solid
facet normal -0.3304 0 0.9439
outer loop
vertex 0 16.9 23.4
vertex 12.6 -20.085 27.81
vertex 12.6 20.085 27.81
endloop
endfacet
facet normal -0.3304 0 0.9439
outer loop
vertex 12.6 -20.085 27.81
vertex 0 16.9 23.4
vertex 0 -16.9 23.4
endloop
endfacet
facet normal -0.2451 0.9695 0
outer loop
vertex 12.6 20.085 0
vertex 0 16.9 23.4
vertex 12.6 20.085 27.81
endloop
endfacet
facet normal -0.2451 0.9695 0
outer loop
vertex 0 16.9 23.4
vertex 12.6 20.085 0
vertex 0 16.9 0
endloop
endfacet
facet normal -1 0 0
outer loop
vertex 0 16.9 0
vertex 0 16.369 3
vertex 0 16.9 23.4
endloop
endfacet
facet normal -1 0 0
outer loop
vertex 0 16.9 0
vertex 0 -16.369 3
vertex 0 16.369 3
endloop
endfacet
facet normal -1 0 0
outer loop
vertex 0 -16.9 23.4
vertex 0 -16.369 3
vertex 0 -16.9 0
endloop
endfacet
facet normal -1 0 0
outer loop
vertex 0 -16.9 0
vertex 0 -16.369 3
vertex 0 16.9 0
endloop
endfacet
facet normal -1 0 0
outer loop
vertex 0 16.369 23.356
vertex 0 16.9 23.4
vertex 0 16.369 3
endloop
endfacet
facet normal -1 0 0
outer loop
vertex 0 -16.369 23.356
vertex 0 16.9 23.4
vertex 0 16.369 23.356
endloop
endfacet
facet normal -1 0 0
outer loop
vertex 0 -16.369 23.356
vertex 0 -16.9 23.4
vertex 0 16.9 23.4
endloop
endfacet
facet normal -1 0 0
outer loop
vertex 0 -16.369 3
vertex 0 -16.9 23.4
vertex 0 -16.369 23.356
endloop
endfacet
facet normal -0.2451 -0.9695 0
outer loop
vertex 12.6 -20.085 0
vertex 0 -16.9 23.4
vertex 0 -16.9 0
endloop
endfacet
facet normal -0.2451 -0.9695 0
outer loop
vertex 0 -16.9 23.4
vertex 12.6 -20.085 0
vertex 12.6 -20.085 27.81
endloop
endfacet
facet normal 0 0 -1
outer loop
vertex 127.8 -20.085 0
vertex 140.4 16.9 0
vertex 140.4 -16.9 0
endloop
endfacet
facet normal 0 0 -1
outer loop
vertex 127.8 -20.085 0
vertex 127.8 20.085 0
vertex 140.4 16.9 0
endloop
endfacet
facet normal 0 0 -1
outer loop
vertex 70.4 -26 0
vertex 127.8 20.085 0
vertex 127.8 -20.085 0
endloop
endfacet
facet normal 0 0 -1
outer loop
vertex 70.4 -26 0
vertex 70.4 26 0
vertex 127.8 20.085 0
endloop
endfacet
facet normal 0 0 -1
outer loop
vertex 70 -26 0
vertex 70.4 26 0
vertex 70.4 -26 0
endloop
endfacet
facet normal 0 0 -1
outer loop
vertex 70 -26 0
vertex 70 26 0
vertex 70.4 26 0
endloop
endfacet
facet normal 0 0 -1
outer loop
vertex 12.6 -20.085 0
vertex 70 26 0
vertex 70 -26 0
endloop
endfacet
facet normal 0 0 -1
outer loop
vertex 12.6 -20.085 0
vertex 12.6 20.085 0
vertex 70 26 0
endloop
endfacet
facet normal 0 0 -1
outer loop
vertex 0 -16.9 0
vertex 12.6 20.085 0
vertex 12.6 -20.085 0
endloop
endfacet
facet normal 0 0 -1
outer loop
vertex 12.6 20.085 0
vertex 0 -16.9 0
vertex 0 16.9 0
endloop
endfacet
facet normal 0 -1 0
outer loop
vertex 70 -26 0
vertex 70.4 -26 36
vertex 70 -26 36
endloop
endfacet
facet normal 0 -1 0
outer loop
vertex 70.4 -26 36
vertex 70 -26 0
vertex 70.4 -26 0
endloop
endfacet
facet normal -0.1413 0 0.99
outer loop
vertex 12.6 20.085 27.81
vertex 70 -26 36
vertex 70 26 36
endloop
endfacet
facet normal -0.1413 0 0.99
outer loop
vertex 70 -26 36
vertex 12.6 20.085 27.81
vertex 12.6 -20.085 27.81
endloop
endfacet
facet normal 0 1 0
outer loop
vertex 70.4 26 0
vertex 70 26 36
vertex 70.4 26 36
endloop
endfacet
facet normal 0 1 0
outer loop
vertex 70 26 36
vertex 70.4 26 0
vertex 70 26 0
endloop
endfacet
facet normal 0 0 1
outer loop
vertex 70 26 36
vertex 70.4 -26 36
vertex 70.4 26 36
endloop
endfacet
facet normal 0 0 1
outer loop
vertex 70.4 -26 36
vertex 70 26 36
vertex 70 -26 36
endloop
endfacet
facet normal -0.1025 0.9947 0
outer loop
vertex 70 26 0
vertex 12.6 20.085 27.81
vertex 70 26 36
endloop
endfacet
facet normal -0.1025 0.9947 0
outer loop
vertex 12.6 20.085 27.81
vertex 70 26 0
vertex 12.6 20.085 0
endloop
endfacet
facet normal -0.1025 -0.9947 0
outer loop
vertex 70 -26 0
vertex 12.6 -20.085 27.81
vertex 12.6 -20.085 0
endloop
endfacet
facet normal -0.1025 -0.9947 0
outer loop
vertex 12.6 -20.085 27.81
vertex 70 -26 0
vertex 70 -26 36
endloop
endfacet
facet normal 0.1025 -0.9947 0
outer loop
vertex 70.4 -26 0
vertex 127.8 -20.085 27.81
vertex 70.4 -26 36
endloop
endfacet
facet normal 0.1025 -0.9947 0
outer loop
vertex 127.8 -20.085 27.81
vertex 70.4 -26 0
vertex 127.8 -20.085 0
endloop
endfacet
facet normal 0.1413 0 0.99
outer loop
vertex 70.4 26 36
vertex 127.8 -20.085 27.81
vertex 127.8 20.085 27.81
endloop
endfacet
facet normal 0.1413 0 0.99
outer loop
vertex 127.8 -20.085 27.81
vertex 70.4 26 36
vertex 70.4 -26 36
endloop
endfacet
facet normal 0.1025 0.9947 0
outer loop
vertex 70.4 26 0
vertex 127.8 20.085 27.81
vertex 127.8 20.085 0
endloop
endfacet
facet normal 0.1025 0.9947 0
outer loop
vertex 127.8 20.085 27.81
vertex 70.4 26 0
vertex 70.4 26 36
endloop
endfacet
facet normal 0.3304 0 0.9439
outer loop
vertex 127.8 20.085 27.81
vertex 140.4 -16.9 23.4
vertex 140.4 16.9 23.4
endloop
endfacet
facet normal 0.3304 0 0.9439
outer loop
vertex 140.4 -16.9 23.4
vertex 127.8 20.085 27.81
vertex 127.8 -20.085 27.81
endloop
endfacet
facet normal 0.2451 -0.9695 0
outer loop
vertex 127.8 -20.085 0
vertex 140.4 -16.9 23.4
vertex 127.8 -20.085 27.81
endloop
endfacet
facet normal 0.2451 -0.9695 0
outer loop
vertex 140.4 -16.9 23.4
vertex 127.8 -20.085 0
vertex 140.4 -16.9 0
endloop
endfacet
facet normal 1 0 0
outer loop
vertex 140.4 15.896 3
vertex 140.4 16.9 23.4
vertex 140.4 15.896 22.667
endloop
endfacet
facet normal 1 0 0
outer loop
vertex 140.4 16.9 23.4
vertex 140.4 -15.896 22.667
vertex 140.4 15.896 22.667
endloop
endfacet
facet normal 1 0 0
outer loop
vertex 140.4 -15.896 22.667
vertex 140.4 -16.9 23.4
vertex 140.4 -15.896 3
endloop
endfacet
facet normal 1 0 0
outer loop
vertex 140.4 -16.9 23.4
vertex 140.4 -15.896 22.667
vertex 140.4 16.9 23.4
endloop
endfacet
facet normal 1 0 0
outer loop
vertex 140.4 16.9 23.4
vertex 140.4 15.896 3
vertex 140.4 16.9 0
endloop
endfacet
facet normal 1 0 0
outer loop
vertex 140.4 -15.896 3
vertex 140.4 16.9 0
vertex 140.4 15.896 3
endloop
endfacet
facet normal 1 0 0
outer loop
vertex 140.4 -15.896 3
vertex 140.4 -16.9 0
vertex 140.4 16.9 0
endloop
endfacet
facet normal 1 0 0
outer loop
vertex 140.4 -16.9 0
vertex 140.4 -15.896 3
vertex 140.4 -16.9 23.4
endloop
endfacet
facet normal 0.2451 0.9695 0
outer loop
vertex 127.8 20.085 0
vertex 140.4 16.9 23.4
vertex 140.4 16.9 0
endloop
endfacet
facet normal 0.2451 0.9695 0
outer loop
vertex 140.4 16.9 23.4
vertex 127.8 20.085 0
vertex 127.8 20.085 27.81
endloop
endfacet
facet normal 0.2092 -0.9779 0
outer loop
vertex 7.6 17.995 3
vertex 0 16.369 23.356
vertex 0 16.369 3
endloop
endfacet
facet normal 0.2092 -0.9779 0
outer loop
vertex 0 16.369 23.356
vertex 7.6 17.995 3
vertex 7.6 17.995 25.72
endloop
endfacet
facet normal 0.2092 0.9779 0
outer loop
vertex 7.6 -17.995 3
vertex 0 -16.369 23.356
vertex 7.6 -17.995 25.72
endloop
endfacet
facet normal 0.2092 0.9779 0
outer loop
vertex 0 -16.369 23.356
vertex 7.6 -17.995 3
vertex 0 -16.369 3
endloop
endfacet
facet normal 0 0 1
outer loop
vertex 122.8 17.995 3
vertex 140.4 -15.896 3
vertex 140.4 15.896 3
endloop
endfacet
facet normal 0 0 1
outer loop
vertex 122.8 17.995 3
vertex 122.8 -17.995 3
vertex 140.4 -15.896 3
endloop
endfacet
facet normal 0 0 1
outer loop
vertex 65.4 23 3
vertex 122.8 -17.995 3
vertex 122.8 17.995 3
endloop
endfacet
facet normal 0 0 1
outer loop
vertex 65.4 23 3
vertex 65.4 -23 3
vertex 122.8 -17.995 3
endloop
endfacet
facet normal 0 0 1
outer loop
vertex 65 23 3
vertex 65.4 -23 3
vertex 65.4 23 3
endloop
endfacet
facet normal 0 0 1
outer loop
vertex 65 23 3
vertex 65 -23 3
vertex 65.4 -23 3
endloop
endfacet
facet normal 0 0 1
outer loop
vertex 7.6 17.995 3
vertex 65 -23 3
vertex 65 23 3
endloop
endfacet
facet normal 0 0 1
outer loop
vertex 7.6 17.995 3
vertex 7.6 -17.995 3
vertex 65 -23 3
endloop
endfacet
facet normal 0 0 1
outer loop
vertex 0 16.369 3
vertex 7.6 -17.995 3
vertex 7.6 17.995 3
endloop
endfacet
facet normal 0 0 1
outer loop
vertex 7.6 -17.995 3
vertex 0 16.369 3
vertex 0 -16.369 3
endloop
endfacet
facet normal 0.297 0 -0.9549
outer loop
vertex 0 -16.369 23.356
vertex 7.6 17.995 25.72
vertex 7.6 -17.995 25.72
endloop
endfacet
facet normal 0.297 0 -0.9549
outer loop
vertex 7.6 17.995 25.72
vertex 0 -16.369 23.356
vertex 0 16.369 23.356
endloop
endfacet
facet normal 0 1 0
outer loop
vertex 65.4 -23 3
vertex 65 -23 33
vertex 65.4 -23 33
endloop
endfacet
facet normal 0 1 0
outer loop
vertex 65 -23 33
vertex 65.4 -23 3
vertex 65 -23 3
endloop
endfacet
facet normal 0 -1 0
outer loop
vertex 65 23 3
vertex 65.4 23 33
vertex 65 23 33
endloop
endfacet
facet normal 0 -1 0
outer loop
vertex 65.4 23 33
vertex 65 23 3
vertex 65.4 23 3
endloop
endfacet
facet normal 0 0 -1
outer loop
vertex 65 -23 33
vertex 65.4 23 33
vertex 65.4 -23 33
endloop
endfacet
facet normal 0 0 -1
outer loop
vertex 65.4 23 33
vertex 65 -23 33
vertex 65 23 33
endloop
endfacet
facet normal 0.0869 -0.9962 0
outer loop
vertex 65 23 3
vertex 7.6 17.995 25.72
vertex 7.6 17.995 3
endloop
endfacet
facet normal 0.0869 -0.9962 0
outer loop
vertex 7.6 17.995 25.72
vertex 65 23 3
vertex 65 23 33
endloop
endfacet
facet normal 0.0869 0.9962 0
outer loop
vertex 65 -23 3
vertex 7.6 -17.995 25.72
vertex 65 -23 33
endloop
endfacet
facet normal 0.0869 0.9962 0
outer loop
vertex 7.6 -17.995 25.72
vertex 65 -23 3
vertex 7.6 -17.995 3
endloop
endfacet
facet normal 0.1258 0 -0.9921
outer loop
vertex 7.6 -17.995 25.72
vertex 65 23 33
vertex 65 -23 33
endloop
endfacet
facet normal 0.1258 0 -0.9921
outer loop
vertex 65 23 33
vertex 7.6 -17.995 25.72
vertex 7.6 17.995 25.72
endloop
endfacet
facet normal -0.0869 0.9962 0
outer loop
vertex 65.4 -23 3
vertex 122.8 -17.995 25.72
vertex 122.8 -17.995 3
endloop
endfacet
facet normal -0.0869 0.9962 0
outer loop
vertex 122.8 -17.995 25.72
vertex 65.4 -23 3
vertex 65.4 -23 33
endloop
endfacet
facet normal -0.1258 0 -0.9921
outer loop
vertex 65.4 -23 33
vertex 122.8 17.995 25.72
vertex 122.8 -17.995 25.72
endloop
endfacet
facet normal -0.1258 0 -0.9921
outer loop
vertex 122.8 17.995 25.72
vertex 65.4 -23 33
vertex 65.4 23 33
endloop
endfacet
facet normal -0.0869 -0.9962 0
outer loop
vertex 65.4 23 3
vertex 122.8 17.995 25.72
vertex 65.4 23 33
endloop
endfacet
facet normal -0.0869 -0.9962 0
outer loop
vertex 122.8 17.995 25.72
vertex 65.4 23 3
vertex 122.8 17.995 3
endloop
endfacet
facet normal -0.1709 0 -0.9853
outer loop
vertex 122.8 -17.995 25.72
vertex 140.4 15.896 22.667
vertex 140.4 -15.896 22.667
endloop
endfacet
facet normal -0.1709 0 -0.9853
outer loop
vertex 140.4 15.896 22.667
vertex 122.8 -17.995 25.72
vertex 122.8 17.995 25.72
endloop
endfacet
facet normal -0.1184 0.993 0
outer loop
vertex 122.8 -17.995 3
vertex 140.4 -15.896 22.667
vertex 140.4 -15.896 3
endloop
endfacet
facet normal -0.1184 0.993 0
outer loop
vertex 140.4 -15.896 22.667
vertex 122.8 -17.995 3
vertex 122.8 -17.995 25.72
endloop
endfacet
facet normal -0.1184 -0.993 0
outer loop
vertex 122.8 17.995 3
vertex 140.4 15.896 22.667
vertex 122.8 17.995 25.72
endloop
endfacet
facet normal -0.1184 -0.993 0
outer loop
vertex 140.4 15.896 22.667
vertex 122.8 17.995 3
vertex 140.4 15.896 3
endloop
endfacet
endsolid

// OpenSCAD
$fn = 32;

// ----------------------------------------------------------------------
// Faired channel: 140 x 52 x 36 mm, 3 mm walls, faired ends
// ----------------------------------------------------------------------

// --- parameters (mm) ---
length = 140;             // channel length
width = 52;               // channel width at mid length
height = 36;              // channel height at mid length
wall = 3;                 // side wall thickness
floor_t = 3;              // floor thickness
end_w = 33.8;             // faired end width
end_h = 23.4;             // faired end height

difference() {
  union() {
    hull() {
      translate([0, -16.9, 0]) cube([0.4, 33.8, 23.4]);
      translate([12.6, -20.085, 0]) cube([0.4, 40.17, 27.81]);
    }
    hull() {
      translate([12.6, -20.085, 0]) cube([0.4, 40.17, 27.81]);
      translate([70, -26, 0]) cube([0.4, 52, 36]);
    }
    hull() {
      translate([70, -26, 0]) cube([0.4, 52, 36]);
      translate([127.4, -20.085, 0]) cube([0.4, 40.17, 27.81]);
    }
    hull() {
      translate([127.4, -20.085, 0]) cube([0.4, 40.17, 27.81]);
      translate([140, -16.9, 0]) cube([0.4, 33.8, 23.4]);
    }
  }
  /* cavity, 5 mm proud of both ends so the ports are cut clean */
  hull() {
    translate([-5, -15.3, 3]) cube([0.4, 30.6, 18.8]);
    translate([7.6, -17.995, 3]) cube([0.4, 35.99, 22.72]);
  }
  hull() {
    translate([7.6, -17.995, 3]) cube([0.4, 35.99, 22.72]);
    translate([65, -23, 3]) cube([0.4, 46, 30]);
  }
  hull() {
    translate([65, -23, 3]) cube([0.4, 46, 30]);
    translate([122.4, -17.995, 3]) cube([0.4, 35.99, 22.72]);
  }
  hull() {
    translate([122.4, -17.995, 3]) cube([0.4, 35.99, 22.72]);
    translate([145, -15.3, 3]) cube([0.4, 30.6, 18.8]);
  }
}
